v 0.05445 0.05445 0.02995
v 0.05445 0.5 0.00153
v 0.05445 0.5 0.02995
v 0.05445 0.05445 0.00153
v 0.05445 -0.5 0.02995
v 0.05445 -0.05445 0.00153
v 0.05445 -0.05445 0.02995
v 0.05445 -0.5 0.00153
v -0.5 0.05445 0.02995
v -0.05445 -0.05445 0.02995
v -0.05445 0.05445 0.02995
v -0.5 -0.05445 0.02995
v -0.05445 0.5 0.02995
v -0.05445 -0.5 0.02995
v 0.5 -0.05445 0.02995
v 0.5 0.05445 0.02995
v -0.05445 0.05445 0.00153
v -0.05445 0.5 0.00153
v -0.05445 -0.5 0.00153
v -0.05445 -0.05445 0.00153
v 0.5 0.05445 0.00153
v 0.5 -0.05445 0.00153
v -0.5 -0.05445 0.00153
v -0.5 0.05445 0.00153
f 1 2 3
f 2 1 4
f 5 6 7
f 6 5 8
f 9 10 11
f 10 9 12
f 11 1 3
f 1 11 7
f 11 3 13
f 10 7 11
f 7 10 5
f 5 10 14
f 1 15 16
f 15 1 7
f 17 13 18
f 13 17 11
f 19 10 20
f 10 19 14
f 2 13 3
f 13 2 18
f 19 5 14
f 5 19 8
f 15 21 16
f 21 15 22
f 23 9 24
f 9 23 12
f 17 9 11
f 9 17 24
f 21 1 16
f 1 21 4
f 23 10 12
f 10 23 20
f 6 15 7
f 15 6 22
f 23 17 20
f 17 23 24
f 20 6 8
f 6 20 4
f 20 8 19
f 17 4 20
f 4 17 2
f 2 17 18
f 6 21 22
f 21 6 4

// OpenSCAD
// maze parts

//outer_size * 0.05;
//shape = 17;

//outer_size * 0.125;
//shape = 16;
shape = 17;

module pathway(direction, pscale) {
    outer_size = 1.0;
    cut_size = outer_size * 0.5;
    inner_size = outer_size * 1.0;
    core_size = outer_size / 1.015;
    path_size = outer_size * 0.33 * pscale;
    path_size_h = outer_size * 0.4;
    //path_size = outer_size * 0.125;
    inner_path_size = path_size_h * 0.95;
    fudge = 0.06 * outer_size;
    inner_intersection_size = 0.6;
    quarter_slice_size = 0.34;
    outer_fudge_smidge = (outer_size+fudge)*0.789;
    half_smidge = 0.33;
      
    scale([1, 1.0, 0.55]) {
        intersection() {
            if (direction == 5) {
                translate([-cut_size*inner_intersection_size,0,0]) {
                    cube(size=[inner_size, path_size, inner_size], center=true);
                }
            }
    
            if (direction == 6) {
                translate([cut_size*inner_intersection_size,0,0]) {
                    cube(size=[inner_size, path_size, inner_size], center=true);
                }
            }
    
            if (direction == 7) {
                translate([0,-cut_size*inner_intersection_size,0]) {
                    cube(size=[path_size, inner_size, inner_size], center=true);
                }
            }
    
            if (direction == 8) {
                translate([0,cut_size*inner_intersection_size,0]) {
                    cube(size=[path_size, inner_size, inner_size], center=true);
                }
            }
    
            if (direction == 9) {
                cube(size=[path_size, inner_size, inner_size], center=true);
            }
    
            if (direction == 10) {
                cube(size=[inner_size, path_size, inner_size], center=true);
            }
    
            if (direction == 11) {
                union() {
                    translate([cut_size*inner_intersection_size,0,0]) {
                        cube(size=[inner_size, path_size, inner_size], center=true);
                    }
    
                    translate([0,-cut_size*inner_intersection_size,0]) {
                        cube(size=[path_size, inner_size, inner_size], center=true);
                    }
                }
            }
            
            if (direction == 12) {
                union() {
                    translate([cut_size*inner_intersection_size,0,0]) {
                        cube(size=[inner_size, path_size, inner_size], center=true);
                    }
                    
                    translate([0,cut_size*inner_intersection_size,0]) {
                        cube(size=[path_size, inner_size, inner_size], center=true);
                    }
                }
            }
    
            if (direction == 13) {
                union() {
                    translate([-cut_size*inner_intersection_size,0,0]) {
                        cube(size=[inner_size, path_size, inner_size], center=true);
                    }
    
                    translate([0,cut_size*inner_intersection_size,0]) {
                        cube(size=[path_size, inner_size, inner_size], center=true);
                    }
                }
            }
    
            if (direction == 14) {
                union() {
                    translate([-cut_size*inner_intersection_size,0,0]) {
                        cube(size=[inner_size, path_size, inner_size], center=true);
                    }
    
                    translate([0,-cut_size*inner_intersection_size,0]) {
                        cube(size=[path_size, inner_size, inner_size], center=true);
                    }
                }
            }
    
            difference() {
                union() {
                    cube(size=[path_size, outer_size, path_size], center=true);
                    cube(size=[outer_size, path_size, path_size], center=true);
                }
    
                translate([0,0,path_size * half_smidge]) {
                    if (direction == 0) {
                        cube(size=[inner_path_size, outer_size+fudge, inner_path_size], center=true);
                        cube(size=[outer_size+fudge, inner_path_size, inner_path_size], center=true);
                    }
    
                    if (direction == 1) {
                        translate([0,outer_size*half_smidge,0]) {
                            cube(size=[inner_path_size, outer_size+fudge, inner_path_size], center=true);
                        }
                        cube(size=[outer_size+fudge, inner_path_size, inner_path_size], center=true);
                    }
    
                    if (direction == 2) {
                        translate([0,-outer_size*half_smidge,0]) {
                            cube(size=[inner_path_size, outer_size+fudge, inner_path_size], center=true);
                        }
                        cube(size=[outer_size+fudge, inner_path_size, inner_path_size], center=true);
                    }
    
                    if (direction == 3) {
                        cube(size=[inner_path_size, outer_size+fudge, inner_path_size], center=true);
                        translate([outer_size*half_smidge,0,0]) {
                           cube(size=[outer_size+fudge, inner_path_size, inner_path_size], center=true);
                        }
                    }
    
                    if (direction == 4) {
                        cube(size=[inner_path_size, outer_size+fudge, inner_path_size], center=true);
                        translate([-outer_size*half_smidge,0,0]) {
                            cube(size=[outer_size+fudge, inner_path_size, inner_path_size], center=true);
                        }
                    }
    
                    if (direction == 5) {
                        translate([-outer_size*quarter_slice_size,0,0]) {
                            cube(size=[outer_size+fudge, inner_path_size, inner_path_size], center=true);
                        }
                    }
    
                    if (direction == 6) {
                        translate([outer_size*quarter_slice_size,0,0]) {
                            cube(size=[outer_size+fudge, inner_path_size, inner_path_size], center=true);
                        }
                    }
    
                    if (direction == 7) {
                        translate([0,-outer_size*quarter_slice_size,0]) {
                            cube(size=[inner_path_size, outer_size+fudge, inner_path_size], center=true);
                        }
                    }
    
                    if (direction == 8) {
                        translate([0, outer_size*quarter_slice_size,0]) {
                            cube(size=[inner_path_size, outer_size+fudge, inner_path_size], center=true);
                        }
                    }
    
                    if (direction == 9) {
                        cube(size=[inner_path_size, outer_size+fudge, inner_path_size], center=true);
                    }
    
                    if (direction == 10) {
                        cube(size=[outer_size+fudge, inner_path_size, inner_path_size], center=true);
                    }
    
                    if (direction == 11) {
                        union() {
                            translate([outer_size*quarter_slice_size,0,0]) {
                                cube(size=[outer_fudge_smidge, inner_path_size, inner_path_size], center=true);
                            }
    
                            translate([0,-outer_size*quarter_slice_size,0]) {
                                cube(size=[inner_path_size, outer_fudge_smidge, inner_path_size], center=true);
                            }
                        }
                    }
    
                    if (direction == 12) {
                        union() {
                            translate([outer_size*quarter_slice_size,0,0]) {
                                cube(size=[outer_fudge_smidge, inner_path_size, inner_path_size], center=true);
                            }
    
                            translate([0, outer_size*quarter_slice_size,0]) {
                                cube(size=[inner_path_size, outer_fudge_smidge, inner_path_size], center=true);
                            }
                        }
                    }
    
                    if (direction == 13) {
                        union() {
                            translate([-outer_size*quarter_slice_size,0,0]) {
                                cube(size=[outer_fudge_smidge, inner_path_size, inner_path_size], center=true);
                            }
    
                            translate([0, outer_size*quarter_slice_size,0]) {
                                cube(size=[inner_path_size, outer_fudge_smidge, inner_path_size], center=true);
                            }
                        }
                    }
    
                    if (direction == 14) {
                        union() {
                            translate([-outer_size*quarter_slice_size,0,0]) {
                                cube(size=[outer_fudge_smidge, inner_path_size, inner_path_size], center=true);
                            }
    
                            translate([0,-outer_size*quarter_slice_size,0]) {
                                cube(size=[inner_path_size, outer_fudge_smidge, inner_path_size], center=true);
                            }
                        }
                    }
                }
    
                translate([0,0,-path_size*0.75]) {
                    union() {
                        cube(size=[path_size+fudge, outer_size+fudge, path_size+fudge], center=true);
                        cube(size=[outer_size+fudge, path_size+fudge, path_size+fudge], center=true);
                    }
                }
            }
        }
    }
        
    if (shape < 15 && shape >= 0) {
      translate([quarter_slice_size * 0.5, quarter_slice_size * 0.5, quarter_slice_size * 0.35]) {
          cube(size=[0.03, 0.03, 0.03], center=true);
      }
    
      translate([-quarter_slice_size * 0.5, -quarter_slice_size * 0.5, quarter_slice_size * 0.35]) {
          cube(size=[0.03, 0.03, 0.03], center=true);
      }
    
      translate([quarter_slice_size * 0.5, -quarter_slice_size * 0.5, quarter_slice_size * 0.35]) {
          cube(size=[0.03, 0.03, 0.03], center=true);
      }
    
      translate([-quarter_slice_size * 0.5, quarter_slice_size * 0.5, quarter_slice_size * 0.35]) {
          cube(size=[0.03, 0.03, 0.03], center=true);
      }
    
      translate([outer_size * 0.5,outer_size*0.5,outer_size*0.5]) {
          cube(size=[0.01, 0.01, 0.01], center=true);
      }
    
      translate([-outer_size * 0.5,outer_size*0.5,outer_size*0.5]) {
          cube(size=[0.01, 0.01, 0.01], center=true);
      }
    
      translate([-outer_size * 0.5,-outer_size*0.5,outer_size*0.5]) {
          cube(size=[0.01, 0.01, 0.01], center=true);
      }
    
      translate([-outer_size * 0.5,-outer_size*0.5,-outer_size*0.5]) {
          cube(size=[0.01, 0.01, 0.01], center=true);
      }
    
      translate([outer_size * 0.5,-outer_size*0.5,-outer_size*0.5]) {
          cube(size=[0.01, 0.01, 0.01], center=true);
      }
    
      translate([outer_size * 0.5,outer_size*0.5,-outer_size*0.5]) {
          cube(size=[0.01, 0.01, 0.01], center=true);
      }
    
      translate([-outer_size * 0.5,outer_size*0.5,-outer_size*0.5]) {
          cube(size=[0.01, 0.01, 0.01], center=true);
      }
    
      translate([outer_size * 0.5,-outer_size*0.5,outer_size*0.5]) {
          cube(size=[0.01, 0.01, 0.01], center=true);
      }
    }
}

if (false) {
 for (offset=[0:15]) {
     translate([(offset*(1.01+0)),0,0]) {
         pathway(offset, 1.0);
     }
 }
} else {
    if (shape > 15) {
      if (shape == 16) {
          pathway(15, 0.77);
      }
    
      if (shape == 17) {
          pathway(15, 0.33);
      }
    } else {
      pathway(shape, 1.0);
    }
}
